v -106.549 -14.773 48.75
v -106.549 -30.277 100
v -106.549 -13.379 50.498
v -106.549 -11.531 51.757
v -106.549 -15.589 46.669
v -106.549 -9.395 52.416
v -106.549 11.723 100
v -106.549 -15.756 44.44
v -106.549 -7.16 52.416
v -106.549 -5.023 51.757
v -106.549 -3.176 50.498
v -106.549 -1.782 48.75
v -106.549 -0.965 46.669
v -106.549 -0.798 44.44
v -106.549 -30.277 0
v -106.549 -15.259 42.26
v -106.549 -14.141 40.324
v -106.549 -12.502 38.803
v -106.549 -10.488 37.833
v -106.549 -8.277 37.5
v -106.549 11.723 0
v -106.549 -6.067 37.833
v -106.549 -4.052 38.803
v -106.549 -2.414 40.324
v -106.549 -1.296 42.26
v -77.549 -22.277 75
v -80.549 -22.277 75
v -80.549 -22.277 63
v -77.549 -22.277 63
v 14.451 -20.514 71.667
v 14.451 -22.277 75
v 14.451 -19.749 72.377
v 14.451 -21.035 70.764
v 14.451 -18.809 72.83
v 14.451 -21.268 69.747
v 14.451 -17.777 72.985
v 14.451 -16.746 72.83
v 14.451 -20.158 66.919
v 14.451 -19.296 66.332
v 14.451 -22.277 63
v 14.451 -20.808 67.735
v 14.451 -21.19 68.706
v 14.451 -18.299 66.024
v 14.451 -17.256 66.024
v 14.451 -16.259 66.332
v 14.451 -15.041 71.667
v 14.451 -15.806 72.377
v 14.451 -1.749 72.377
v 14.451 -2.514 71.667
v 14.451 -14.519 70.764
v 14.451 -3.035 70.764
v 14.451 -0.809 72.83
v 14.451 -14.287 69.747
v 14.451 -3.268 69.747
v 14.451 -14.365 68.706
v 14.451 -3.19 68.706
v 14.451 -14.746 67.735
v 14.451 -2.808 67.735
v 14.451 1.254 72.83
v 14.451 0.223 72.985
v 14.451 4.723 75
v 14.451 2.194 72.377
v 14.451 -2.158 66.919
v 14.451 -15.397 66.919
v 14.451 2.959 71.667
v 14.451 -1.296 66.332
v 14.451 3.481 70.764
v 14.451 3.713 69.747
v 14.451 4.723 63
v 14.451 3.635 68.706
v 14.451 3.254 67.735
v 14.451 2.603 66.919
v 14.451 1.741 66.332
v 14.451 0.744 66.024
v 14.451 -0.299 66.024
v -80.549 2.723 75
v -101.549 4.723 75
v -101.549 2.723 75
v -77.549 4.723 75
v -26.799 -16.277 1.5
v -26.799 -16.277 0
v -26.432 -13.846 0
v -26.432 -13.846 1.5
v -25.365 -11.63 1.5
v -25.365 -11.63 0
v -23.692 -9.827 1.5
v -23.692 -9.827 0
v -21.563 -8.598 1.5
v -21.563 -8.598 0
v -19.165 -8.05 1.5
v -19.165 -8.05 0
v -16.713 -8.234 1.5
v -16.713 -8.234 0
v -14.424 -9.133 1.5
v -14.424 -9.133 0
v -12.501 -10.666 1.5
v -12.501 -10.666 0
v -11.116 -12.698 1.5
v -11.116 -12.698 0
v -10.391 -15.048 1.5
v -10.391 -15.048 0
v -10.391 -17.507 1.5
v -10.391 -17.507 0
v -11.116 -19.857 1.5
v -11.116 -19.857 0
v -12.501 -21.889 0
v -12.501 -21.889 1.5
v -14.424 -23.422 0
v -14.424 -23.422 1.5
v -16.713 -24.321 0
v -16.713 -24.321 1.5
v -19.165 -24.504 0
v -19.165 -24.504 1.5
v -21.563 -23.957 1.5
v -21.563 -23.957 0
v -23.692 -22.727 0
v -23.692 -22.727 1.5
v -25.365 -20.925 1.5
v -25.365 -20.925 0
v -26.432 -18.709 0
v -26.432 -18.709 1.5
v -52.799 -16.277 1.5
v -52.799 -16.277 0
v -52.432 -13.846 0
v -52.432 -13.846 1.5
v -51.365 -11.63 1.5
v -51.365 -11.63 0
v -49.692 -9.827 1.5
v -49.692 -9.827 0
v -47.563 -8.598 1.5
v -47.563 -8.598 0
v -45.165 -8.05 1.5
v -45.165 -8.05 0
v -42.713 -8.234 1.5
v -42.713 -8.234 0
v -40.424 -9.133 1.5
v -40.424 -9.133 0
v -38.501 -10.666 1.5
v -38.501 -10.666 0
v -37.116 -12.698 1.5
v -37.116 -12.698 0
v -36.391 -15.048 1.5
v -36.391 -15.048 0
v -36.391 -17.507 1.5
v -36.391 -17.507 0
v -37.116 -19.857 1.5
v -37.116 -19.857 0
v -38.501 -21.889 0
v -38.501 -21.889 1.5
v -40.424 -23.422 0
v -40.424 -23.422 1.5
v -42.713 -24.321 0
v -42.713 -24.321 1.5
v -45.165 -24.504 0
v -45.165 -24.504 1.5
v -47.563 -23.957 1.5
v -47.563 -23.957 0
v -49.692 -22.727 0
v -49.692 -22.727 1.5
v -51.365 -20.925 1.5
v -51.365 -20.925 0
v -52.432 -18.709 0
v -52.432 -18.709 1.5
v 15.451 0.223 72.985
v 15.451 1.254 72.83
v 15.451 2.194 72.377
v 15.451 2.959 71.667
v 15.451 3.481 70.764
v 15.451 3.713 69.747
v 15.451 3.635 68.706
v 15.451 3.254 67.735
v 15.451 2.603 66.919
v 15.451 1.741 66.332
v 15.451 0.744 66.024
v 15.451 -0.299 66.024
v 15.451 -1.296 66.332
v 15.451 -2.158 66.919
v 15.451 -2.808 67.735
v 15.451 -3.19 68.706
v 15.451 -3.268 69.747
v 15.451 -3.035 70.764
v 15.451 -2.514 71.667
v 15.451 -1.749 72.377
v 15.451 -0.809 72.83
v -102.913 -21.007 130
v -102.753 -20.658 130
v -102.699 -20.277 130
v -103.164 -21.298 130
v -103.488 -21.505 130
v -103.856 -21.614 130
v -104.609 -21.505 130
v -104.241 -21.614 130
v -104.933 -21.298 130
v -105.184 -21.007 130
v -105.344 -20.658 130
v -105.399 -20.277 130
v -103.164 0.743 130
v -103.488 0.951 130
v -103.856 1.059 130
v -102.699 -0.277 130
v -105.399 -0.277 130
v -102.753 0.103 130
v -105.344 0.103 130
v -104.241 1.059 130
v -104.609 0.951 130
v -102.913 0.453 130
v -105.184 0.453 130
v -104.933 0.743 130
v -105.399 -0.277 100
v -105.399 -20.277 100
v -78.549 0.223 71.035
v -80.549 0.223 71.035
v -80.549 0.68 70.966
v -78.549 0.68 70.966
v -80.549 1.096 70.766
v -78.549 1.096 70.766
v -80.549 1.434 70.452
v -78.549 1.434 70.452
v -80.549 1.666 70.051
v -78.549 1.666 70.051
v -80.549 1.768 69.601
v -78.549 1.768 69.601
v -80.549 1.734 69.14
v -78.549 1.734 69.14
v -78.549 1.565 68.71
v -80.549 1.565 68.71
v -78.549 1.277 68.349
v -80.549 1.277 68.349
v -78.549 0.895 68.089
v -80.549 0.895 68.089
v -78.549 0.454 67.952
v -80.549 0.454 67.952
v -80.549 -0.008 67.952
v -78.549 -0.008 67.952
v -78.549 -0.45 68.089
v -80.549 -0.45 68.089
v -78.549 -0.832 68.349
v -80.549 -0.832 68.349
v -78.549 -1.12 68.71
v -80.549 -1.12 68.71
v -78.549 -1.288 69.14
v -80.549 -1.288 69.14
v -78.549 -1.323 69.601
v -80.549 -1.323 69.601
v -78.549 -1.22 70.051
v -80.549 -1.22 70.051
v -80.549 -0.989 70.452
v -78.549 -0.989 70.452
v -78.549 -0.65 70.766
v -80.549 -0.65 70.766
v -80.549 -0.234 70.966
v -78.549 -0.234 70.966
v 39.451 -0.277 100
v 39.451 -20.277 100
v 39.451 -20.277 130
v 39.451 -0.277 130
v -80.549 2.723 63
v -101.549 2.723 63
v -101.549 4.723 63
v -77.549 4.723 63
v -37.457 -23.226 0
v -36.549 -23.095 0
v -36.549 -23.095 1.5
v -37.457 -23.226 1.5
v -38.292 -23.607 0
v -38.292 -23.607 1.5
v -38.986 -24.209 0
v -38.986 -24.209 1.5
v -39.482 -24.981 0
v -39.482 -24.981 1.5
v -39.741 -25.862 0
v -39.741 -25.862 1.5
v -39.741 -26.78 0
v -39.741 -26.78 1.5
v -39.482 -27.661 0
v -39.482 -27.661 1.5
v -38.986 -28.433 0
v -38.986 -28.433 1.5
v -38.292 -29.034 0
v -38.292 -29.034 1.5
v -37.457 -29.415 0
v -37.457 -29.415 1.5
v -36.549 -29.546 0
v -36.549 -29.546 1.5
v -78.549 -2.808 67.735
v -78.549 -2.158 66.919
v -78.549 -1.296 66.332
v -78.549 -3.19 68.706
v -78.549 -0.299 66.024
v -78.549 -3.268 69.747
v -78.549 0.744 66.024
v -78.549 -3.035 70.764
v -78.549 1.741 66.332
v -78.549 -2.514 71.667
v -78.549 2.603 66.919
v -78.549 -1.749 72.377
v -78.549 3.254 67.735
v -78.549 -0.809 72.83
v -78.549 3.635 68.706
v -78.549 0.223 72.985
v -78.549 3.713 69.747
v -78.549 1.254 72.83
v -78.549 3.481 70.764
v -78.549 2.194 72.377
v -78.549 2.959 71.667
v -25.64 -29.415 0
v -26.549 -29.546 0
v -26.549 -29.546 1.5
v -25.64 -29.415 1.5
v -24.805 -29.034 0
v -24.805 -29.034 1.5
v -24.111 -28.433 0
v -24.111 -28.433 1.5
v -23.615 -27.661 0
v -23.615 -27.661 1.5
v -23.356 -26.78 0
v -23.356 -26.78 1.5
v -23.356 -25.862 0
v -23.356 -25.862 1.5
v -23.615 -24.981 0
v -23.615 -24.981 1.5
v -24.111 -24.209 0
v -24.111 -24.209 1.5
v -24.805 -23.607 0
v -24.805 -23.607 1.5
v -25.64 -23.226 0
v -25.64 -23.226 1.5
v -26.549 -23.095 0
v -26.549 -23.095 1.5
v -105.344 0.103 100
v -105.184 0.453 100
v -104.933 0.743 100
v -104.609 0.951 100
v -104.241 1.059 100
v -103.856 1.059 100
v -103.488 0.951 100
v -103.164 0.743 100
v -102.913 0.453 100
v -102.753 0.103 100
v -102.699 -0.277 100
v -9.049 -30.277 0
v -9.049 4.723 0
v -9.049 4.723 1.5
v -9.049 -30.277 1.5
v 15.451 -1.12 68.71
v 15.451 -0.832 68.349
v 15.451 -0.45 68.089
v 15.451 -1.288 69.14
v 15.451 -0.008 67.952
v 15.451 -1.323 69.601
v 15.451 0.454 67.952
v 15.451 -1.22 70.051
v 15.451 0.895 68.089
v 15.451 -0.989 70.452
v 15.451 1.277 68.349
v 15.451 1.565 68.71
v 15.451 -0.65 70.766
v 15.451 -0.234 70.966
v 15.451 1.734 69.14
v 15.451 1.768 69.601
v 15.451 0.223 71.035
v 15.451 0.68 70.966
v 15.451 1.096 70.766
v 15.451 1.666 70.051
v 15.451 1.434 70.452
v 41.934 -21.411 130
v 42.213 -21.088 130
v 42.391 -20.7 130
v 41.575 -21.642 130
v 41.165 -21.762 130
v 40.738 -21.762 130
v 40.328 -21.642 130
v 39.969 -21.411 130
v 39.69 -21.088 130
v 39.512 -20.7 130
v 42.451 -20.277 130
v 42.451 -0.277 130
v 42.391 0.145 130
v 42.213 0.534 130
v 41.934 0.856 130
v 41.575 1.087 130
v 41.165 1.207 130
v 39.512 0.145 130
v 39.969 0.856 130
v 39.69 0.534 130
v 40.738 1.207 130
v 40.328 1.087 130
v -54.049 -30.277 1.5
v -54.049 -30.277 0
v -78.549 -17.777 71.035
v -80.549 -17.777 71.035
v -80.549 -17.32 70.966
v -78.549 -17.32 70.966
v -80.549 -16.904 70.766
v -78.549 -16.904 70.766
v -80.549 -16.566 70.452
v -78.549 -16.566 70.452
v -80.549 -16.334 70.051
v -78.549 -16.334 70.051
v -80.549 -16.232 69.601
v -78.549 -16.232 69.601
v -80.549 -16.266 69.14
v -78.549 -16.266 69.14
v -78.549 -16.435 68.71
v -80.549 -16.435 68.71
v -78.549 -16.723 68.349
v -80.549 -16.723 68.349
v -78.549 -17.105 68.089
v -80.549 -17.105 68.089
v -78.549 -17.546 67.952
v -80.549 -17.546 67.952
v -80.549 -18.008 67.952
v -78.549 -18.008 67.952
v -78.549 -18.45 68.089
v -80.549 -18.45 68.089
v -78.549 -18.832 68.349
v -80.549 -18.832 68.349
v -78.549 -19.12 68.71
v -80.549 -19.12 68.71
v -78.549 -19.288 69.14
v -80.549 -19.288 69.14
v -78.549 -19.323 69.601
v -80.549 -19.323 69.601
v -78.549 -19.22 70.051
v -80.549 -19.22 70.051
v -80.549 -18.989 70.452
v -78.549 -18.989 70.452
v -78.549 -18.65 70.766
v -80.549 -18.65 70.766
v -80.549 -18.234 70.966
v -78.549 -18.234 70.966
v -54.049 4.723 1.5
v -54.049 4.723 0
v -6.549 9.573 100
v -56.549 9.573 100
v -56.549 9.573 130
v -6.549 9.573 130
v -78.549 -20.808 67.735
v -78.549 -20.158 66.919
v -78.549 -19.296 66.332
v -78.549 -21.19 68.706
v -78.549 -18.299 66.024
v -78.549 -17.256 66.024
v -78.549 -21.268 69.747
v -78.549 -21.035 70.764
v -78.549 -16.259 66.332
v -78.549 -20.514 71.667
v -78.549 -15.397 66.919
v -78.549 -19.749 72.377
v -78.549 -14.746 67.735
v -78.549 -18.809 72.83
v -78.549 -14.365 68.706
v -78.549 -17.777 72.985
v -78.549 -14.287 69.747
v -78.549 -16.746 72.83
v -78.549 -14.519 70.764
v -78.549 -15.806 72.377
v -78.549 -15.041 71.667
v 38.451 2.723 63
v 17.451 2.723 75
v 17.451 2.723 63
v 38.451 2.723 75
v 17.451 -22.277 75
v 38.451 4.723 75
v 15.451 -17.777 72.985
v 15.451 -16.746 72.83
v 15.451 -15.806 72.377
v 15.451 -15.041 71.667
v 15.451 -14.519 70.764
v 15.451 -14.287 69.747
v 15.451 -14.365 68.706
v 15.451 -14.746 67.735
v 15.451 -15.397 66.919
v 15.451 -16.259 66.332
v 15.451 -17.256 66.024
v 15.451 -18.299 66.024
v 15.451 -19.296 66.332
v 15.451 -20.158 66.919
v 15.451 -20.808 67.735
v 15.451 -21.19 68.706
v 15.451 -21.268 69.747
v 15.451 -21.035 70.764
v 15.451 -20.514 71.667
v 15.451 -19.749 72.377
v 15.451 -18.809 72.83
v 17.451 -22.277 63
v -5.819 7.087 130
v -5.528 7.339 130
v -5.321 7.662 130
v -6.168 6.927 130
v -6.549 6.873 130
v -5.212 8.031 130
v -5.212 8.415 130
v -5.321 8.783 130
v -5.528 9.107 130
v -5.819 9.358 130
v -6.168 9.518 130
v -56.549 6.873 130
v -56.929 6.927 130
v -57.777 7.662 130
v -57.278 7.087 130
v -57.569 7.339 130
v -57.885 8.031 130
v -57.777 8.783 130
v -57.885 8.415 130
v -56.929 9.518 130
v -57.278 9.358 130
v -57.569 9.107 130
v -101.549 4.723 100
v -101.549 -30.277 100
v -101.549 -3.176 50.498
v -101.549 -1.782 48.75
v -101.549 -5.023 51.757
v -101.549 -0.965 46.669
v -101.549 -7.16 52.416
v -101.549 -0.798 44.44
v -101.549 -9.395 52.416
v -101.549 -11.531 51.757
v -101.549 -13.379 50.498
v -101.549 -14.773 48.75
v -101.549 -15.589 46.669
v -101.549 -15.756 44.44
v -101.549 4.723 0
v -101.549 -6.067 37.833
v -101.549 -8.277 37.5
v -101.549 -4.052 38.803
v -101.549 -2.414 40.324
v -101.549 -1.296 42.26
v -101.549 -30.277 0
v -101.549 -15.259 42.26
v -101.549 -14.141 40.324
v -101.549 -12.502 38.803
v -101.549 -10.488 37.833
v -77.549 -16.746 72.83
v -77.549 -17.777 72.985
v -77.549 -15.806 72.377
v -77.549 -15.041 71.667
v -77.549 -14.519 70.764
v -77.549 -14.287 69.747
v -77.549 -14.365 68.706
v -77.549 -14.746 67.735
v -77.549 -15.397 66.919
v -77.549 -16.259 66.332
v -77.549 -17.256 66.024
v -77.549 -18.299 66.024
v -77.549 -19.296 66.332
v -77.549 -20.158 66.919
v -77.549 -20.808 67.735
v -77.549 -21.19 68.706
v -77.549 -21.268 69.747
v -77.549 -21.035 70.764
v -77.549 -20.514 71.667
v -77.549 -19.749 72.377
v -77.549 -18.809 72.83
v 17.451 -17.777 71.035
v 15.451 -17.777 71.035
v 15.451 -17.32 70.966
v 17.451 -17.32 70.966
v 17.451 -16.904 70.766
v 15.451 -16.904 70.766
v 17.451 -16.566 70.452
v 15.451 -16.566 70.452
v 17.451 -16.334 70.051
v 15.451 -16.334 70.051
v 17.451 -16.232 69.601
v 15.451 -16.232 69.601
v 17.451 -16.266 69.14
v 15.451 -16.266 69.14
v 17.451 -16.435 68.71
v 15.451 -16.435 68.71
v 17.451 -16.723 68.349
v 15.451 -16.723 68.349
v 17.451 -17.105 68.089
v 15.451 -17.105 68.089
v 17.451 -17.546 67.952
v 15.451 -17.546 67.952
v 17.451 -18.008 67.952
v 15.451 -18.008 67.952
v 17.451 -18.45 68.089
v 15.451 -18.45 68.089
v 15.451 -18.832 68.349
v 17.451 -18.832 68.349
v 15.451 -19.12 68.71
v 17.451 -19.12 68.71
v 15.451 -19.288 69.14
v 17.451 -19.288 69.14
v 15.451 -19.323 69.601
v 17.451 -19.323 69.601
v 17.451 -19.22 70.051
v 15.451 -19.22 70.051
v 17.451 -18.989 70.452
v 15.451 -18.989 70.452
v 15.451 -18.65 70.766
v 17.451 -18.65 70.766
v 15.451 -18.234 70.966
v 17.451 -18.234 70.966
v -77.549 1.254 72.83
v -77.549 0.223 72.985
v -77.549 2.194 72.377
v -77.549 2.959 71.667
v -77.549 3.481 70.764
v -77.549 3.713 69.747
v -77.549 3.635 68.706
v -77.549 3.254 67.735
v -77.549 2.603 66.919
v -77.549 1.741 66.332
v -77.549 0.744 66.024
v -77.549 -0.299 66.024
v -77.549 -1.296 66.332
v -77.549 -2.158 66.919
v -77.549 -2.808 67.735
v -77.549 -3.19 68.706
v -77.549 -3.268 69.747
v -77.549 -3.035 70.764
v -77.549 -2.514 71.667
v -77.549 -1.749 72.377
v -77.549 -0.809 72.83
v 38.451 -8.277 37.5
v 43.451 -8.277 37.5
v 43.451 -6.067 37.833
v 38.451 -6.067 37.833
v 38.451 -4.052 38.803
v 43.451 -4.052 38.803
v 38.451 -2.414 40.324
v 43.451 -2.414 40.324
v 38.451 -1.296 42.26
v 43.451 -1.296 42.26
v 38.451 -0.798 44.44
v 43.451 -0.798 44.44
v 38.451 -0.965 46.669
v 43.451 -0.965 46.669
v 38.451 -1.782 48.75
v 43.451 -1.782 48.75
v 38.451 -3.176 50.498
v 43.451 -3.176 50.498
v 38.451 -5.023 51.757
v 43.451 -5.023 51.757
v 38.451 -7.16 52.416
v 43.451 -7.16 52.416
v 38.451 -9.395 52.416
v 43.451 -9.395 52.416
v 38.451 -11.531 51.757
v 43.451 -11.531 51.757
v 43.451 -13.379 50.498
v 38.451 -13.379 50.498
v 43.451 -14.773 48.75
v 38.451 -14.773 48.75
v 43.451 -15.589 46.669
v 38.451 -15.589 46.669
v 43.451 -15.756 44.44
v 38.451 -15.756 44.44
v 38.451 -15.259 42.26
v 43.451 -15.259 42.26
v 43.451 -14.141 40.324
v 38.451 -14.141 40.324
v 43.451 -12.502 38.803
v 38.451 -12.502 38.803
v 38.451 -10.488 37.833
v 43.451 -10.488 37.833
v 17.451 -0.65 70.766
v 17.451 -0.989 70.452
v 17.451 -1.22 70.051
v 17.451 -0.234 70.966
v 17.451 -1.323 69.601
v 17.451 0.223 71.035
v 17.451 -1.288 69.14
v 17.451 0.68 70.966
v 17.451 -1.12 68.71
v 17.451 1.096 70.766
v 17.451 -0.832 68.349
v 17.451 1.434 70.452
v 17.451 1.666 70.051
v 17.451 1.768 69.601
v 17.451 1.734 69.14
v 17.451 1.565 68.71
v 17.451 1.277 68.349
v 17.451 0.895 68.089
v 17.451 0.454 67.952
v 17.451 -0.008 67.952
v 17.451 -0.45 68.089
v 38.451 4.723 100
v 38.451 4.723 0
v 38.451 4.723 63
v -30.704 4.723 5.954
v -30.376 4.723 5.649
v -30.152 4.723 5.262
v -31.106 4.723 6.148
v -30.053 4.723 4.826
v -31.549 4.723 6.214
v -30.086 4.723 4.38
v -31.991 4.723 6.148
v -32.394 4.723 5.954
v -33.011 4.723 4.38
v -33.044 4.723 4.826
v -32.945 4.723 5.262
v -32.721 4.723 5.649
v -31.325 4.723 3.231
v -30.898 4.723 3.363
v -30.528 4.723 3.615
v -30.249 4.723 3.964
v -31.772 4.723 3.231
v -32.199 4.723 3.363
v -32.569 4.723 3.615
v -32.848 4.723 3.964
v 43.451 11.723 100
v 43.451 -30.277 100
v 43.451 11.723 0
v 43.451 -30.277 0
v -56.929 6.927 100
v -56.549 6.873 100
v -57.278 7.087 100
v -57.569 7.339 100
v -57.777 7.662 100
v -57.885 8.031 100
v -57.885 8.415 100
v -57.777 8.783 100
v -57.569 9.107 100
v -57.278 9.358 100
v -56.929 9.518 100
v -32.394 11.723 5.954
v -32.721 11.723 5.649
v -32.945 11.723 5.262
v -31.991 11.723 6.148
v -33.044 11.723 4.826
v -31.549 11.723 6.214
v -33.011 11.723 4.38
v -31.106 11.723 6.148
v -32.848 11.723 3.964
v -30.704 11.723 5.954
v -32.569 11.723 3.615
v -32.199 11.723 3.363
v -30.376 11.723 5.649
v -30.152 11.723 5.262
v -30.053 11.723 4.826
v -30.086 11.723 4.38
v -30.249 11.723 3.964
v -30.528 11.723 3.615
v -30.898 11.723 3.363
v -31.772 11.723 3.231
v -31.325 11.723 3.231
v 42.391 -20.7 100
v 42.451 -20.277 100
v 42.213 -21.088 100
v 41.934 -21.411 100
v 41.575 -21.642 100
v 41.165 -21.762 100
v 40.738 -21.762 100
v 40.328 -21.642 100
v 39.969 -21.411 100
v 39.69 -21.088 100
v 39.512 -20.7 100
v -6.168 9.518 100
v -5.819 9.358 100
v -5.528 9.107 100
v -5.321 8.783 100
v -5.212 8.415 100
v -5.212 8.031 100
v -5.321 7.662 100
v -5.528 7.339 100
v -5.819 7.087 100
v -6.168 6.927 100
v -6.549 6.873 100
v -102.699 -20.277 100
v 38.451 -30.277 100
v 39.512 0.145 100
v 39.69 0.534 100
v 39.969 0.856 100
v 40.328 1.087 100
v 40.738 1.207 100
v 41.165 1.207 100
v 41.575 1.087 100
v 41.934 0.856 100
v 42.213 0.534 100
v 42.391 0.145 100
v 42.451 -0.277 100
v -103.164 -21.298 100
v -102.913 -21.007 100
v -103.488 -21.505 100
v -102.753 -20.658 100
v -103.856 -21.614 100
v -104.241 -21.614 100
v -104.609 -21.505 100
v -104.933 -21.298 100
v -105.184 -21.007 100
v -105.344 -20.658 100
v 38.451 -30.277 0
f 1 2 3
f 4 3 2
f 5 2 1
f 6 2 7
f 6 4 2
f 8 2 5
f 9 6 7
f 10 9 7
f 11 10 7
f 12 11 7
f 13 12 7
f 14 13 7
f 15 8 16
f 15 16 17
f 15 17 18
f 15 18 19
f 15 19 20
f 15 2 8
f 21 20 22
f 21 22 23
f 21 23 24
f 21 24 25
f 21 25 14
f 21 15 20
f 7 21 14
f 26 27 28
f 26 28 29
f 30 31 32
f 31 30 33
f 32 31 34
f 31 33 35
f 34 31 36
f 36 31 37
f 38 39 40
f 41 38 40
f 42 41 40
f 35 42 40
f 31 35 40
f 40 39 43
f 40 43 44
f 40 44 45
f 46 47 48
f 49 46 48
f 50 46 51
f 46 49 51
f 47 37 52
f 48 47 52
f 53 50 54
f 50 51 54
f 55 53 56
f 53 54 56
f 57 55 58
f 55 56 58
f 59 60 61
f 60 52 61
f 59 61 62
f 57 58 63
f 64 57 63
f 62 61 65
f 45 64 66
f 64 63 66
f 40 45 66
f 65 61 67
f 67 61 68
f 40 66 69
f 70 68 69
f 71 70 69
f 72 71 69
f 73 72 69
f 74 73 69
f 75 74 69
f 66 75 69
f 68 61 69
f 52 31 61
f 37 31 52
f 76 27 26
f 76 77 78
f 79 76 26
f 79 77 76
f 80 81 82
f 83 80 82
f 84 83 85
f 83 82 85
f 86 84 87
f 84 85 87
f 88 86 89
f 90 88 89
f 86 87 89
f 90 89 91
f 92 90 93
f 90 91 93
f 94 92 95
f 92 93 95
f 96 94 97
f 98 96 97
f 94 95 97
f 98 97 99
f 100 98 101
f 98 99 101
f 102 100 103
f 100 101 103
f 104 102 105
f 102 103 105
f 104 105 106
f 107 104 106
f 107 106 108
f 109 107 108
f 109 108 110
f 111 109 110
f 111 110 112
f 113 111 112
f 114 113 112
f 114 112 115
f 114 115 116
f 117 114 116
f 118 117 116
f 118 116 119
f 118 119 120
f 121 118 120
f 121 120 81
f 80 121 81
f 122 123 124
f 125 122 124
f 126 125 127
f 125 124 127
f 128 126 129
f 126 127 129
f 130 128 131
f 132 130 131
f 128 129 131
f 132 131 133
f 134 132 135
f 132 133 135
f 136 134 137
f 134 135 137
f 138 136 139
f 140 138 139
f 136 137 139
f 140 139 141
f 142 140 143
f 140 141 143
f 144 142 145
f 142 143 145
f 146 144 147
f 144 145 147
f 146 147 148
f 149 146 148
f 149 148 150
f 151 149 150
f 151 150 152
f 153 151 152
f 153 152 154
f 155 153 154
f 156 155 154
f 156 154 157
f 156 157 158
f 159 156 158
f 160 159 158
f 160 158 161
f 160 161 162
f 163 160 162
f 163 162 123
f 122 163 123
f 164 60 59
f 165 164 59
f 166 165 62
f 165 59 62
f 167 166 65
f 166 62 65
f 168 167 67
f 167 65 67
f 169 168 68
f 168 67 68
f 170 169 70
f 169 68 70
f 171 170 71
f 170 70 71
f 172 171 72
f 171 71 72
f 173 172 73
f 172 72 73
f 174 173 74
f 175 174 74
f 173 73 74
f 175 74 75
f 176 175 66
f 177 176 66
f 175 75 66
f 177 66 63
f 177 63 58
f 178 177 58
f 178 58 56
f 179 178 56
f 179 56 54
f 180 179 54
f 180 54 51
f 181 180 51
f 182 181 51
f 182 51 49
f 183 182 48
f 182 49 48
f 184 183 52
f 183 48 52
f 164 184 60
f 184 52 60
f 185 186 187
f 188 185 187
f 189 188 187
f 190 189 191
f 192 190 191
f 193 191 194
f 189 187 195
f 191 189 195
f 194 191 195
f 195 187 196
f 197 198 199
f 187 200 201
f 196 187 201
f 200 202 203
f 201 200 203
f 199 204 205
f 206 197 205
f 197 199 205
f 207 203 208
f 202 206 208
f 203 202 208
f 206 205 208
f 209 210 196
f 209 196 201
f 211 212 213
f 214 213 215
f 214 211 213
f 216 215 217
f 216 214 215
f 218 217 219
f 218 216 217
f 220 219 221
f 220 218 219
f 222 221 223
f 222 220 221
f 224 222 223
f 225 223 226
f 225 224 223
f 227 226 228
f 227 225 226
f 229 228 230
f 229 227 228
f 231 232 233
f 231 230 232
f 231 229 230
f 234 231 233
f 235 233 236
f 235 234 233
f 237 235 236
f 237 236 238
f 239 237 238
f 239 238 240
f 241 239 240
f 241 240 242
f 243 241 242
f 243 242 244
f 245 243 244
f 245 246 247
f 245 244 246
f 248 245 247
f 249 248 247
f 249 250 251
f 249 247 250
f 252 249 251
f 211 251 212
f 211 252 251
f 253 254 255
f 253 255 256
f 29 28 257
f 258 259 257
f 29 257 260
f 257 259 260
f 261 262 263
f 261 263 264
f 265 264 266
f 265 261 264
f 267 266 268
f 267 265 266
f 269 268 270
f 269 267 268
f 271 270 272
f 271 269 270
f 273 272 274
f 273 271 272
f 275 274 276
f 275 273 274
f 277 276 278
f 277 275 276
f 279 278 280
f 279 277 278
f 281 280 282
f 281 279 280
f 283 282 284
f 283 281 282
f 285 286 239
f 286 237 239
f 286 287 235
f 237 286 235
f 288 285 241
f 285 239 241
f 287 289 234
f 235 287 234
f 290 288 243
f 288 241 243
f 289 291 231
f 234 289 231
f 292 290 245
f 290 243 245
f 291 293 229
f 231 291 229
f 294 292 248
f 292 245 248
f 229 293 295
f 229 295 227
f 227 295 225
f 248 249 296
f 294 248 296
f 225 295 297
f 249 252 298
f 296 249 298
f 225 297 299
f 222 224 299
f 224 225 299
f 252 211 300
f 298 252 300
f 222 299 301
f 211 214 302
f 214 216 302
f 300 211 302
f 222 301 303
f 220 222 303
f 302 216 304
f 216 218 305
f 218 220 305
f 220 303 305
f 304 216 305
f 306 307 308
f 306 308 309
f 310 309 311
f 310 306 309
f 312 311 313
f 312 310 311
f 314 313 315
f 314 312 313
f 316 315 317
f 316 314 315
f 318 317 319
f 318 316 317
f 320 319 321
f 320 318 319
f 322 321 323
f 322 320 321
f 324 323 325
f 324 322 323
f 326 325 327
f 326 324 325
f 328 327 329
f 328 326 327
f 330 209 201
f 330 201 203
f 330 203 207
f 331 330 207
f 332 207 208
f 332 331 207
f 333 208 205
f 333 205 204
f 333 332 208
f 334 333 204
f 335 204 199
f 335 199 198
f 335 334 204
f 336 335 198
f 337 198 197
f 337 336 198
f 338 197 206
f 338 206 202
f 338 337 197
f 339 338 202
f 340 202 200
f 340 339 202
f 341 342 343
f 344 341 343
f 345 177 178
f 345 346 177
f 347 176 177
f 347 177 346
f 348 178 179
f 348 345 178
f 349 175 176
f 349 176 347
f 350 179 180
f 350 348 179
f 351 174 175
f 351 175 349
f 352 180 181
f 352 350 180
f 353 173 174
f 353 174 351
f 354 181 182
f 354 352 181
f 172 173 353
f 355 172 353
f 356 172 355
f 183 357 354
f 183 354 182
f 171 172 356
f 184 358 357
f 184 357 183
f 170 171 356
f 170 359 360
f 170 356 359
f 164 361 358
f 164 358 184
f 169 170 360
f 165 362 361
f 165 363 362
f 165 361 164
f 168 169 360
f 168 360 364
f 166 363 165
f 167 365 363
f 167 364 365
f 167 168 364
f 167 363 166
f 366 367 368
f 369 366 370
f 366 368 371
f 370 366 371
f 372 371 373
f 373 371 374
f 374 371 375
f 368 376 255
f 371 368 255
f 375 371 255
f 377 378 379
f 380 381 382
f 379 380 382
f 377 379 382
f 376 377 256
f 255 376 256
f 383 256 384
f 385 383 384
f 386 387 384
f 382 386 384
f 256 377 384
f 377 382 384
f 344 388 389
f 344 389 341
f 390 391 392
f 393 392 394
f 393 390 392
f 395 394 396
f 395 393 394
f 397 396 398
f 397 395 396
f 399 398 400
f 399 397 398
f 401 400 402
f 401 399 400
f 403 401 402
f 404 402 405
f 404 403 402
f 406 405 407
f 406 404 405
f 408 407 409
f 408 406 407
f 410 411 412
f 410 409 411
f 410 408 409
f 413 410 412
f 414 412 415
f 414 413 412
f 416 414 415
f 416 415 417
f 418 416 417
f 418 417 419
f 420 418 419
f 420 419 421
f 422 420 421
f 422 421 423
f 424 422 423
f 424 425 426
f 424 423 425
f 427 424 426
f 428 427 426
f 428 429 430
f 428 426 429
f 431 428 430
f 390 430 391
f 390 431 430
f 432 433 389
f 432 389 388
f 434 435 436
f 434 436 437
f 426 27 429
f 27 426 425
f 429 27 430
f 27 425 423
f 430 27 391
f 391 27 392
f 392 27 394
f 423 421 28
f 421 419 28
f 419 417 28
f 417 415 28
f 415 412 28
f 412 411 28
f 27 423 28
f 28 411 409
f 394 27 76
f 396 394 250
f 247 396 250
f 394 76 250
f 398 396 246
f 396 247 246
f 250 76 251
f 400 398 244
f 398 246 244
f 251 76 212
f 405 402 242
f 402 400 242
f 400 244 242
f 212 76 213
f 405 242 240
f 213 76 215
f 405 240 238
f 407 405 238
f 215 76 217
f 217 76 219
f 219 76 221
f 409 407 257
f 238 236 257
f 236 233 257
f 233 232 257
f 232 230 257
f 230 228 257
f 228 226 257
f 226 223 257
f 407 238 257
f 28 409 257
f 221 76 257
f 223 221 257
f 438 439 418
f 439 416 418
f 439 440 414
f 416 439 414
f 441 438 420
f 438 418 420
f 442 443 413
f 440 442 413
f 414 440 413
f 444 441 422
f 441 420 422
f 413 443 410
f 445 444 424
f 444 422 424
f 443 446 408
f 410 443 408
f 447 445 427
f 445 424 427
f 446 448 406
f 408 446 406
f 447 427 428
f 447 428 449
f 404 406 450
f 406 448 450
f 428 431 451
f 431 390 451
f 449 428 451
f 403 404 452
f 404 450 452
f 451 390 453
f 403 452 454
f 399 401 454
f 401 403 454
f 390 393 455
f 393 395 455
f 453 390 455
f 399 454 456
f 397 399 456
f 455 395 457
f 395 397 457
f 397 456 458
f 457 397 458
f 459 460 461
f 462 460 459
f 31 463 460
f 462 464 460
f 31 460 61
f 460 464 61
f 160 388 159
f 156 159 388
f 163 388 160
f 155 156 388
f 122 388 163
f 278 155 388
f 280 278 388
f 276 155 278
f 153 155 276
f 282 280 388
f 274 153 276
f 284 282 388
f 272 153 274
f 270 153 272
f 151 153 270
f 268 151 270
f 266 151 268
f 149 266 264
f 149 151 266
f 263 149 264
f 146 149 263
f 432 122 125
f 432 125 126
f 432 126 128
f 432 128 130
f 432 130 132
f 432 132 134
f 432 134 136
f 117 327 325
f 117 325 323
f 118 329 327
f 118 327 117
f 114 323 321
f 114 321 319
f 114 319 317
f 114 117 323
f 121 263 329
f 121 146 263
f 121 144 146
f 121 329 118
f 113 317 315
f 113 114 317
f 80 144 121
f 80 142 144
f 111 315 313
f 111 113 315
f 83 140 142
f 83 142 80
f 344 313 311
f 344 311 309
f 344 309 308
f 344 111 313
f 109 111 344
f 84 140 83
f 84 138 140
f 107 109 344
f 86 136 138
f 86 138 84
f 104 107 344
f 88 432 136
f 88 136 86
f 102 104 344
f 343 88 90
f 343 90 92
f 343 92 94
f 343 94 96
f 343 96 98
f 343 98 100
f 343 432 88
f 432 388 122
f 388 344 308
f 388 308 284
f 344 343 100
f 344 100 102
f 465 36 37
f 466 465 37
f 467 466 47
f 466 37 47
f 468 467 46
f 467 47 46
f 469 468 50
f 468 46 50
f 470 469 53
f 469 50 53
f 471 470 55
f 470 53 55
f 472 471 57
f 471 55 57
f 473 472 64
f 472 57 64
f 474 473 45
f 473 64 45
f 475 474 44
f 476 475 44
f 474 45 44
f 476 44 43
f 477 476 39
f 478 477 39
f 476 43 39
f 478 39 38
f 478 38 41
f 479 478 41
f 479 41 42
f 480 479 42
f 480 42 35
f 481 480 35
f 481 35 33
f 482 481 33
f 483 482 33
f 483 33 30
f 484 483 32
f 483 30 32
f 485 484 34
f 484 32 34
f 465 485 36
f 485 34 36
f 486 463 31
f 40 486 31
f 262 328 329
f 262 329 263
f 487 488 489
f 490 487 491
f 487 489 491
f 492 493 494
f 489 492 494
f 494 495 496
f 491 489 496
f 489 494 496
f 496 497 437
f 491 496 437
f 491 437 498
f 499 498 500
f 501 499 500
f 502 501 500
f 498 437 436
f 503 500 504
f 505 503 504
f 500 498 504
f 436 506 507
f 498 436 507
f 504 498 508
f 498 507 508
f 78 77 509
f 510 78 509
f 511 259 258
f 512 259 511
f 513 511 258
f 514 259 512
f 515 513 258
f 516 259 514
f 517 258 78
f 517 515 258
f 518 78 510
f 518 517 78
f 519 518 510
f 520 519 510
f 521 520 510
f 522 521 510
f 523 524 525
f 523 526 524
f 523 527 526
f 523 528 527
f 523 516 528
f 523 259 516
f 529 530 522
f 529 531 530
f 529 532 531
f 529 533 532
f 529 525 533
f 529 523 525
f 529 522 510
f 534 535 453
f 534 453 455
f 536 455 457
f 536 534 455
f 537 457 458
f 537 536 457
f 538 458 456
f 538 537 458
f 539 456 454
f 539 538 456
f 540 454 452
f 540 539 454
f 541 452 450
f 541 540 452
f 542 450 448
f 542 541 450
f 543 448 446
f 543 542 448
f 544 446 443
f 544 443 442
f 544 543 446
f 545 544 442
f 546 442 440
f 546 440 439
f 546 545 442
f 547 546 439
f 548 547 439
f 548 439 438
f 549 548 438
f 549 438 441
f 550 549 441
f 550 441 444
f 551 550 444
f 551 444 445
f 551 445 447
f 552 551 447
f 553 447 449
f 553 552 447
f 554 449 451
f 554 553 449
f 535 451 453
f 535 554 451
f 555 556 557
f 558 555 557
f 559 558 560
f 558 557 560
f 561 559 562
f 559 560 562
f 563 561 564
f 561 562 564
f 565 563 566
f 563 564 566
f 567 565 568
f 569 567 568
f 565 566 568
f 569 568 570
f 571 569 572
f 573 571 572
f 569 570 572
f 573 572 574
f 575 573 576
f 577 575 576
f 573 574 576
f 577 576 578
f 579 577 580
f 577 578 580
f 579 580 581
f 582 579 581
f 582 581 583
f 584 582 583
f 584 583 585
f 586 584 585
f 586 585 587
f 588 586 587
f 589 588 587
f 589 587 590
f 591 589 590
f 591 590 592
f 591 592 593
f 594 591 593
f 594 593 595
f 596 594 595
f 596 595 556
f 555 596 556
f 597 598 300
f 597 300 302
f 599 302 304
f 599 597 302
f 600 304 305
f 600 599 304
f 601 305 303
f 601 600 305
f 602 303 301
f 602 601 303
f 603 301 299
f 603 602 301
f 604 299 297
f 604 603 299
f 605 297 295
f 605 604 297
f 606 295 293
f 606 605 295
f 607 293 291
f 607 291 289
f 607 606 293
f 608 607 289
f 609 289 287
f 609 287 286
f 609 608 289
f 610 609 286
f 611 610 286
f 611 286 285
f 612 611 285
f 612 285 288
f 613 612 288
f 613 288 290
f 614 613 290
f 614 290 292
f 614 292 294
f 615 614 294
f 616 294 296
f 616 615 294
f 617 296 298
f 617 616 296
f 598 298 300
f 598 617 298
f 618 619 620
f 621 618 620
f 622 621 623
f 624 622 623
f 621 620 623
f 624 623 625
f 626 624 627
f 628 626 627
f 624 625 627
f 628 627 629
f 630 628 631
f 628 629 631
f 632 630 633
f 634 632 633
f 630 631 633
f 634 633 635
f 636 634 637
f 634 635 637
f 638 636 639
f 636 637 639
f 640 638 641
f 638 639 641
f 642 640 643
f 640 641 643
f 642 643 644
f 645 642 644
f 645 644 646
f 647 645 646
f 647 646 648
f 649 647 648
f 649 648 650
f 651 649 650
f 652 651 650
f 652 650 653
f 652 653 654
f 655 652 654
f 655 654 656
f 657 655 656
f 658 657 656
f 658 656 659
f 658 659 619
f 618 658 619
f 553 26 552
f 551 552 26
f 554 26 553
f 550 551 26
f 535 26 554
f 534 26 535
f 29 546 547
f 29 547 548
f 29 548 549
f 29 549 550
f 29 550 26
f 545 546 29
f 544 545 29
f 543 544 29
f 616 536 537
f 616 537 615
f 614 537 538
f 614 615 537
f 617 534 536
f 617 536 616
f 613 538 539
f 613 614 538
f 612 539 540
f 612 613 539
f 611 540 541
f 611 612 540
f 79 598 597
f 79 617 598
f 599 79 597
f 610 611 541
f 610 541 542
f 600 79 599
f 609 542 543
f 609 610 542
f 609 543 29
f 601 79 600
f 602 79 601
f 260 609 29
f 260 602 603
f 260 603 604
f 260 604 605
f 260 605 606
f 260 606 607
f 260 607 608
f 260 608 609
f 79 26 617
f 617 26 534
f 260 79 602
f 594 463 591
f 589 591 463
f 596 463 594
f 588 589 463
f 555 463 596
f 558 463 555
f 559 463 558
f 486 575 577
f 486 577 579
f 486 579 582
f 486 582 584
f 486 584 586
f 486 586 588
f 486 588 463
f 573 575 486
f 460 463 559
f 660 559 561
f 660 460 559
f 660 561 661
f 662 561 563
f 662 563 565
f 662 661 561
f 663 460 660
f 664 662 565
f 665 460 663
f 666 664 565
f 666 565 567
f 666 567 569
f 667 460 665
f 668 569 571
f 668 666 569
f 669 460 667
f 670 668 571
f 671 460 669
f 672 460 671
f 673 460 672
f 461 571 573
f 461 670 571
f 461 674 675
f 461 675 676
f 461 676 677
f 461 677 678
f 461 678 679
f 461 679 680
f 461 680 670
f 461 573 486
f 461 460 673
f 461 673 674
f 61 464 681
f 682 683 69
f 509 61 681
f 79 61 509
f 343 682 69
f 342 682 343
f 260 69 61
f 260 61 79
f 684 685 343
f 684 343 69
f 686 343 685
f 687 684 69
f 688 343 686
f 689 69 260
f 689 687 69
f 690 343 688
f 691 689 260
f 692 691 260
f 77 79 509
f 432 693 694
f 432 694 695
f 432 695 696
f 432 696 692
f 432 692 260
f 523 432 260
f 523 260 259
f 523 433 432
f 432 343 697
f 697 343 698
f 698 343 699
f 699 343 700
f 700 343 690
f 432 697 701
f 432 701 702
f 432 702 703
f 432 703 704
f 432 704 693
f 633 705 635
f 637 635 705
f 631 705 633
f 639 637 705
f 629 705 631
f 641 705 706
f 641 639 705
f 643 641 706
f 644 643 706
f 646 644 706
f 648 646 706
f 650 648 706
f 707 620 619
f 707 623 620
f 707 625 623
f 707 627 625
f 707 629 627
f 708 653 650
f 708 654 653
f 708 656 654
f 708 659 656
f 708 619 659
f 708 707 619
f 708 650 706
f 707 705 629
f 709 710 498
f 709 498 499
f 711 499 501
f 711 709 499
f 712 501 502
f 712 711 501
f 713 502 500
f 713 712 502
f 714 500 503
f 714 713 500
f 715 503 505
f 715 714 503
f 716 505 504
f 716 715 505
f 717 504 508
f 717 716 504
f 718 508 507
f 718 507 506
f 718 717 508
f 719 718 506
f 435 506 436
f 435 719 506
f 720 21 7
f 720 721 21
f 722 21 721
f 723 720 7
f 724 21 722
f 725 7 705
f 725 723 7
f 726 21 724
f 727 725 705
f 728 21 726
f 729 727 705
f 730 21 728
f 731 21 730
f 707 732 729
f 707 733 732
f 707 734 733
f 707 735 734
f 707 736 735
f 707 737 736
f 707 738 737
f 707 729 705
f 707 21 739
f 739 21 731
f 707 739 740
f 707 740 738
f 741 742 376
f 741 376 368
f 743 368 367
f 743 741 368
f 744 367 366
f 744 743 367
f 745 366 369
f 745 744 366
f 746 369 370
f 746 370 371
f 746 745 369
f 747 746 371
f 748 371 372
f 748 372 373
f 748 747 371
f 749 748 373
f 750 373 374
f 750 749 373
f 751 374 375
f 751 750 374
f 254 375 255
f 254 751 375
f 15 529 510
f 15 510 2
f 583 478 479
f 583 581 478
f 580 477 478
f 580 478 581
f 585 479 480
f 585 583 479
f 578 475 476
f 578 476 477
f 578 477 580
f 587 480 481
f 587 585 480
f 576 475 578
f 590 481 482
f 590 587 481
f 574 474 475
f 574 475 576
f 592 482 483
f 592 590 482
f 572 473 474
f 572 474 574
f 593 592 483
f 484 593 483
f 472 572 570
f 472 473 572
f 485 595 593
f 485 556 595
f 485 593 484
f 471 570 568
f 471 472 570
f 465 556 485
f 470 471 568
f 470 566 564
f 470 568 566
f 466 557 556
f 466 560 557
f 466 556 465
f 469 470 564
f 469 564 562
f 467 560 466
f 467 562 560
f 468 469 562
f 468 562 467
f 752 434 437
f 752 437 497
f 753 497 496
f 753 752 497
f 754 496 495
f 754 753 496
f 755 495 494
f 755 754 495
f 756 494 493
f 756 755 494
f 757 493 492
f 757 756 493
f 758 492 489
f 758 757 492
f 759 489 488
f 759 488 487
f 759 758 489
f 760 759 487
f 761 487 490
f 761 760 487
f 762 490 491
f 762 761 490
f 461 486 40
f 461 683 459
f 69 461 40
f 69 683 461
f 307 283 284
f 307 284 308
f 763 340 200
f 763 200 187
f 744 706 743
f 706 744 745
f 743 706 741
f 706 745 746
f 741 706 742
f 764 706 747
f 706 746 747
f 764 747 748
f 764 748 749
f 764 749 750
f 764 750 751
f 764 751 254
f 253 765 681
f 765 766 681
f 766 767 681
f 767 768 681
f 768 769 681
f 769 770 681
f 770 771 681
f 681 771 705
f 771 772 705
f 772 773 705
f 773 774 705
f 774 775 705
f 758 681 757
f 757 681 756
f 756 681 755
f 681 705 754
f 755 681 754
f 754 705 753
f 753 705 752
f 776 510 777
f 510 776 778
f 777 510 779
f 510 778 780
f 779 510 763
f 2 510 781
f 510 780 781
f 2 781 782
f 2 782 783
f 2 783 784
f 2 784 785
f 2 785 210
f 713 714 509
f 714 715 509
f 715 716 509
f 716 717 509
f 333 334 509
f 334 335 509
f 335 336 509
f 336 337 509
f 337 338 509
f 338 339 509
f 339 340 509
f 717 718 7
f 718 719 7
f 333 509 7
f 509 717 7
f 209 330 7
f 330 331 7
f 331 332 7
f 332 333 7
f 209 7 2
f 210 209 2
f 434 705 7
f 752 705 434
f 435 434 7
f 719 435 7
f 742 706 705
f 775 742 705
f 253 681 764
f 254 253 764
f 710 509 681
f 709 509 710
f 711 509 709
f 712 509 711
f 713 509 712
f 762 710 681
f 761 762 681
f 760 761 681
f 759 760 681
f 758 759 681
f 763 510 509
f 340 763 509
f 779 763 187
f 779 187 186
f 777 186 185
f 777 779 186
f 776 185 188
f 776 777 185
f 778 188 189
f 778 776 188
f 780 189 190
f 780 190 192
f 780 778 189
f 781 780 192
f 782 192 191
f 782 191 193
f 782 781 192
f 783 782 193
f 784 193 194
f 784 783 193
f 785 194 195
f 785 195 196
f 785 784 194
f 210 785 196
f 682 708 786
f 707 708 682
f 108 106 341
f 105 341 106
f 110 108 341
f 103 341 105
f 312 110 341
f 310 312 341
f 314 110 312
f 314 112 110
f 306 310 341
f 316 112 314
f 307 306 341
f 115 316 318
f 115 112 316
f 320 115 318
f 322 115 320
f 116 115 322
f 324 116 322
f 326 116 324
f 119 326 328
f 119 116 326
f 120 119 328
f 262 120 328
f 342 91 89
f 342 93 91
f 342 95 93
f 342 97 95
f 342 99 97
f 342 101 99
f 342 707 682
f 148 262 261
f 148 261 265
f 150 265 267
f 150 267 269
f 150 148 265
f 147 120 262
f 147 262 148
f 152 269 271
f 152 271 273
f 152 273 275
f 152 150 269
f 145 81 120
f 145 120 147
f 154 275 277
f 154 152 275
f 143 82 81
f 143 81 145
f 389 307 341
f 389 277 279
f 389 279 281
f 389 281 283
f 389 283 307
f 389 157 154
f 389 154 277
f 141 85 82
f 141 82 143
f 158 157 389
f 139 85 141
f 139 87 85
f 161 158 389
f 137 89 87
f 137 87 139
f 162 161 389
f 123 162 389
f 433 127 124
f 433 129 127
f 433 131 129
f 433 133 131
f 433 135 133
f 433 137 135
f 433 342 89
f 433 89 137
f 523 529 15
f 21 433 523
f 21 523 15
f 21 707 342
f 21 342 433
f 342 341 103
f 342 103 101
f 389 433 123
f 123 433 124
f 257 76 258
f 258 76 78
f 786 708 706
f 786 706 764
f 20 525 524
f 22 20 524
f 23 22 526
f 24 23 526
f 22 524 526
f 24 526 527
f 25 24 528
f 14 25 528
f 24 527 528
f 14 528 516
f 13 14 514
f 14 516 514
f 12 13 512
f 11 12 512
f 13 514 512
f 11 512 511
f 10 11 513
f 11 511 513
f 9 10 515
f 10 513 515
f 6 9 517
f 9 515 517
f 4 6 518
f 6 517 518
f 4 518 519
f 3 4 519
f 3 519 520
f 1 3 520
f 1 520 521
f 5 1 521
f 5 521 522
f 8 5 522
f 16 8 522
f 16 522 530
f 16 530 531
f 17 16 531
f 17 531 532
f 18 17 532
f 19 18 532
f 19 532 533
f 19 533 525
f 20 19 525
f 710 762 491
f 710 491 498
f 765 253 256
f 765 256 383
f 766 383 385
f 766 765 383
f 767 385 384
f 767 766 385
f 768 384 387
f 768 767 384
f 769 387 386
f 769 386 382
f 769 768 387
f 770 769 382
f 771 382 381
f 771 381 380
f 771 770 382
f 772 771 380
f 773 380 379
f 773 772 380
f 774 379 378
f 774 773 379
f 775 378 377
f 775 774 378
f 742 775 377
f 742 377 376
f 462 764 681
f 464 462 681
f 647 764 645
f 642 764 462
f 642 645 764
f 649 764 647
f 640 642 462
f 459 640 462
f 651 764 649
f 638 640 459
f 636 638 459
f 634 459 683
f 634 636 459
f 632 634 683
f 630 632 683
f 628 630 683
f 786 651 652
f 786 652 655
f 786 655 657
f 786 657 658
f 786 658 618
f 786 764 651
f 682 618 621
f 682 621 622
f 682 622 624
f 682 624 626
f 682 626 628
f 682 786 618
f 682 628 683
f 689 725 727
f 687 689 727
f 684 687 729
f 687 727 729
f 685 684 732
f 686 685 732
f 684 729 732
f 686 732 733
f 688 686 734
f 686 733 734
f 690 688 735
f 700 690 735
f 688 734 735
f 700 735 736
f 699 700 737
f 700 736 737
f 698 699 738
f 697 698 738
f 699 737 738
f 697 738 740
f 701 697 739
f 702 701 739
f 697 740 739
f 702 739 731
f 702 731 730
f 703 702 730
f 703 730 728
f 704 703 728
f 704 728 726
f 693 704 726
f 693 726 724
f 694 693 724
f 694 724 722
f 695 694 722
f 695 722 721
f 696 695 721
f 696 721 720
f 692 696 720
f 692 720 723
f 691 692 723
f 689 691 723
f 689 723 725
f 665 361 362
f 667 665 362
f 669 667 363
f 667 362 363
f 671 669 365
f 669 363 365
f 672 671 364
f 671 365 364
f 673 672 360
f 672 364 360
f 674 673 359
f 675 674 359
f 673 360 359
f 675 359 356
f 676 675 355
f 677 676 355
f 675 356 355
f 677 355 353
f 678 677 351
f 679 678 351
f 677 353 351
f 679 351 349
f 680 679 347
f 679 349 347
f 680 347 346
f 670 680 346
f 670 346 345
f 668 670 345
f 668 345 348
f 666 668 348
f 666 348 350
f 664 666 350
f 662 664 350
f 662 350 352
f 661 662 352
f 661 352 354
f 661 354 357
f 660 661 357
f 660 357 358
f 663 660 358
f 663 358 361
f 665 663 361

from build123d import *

# Parameters (mm, degrees)
BOSS_EXTRUDE2_DEPTH = 100
BOSS_EXTRUDE3_DEPTH = 30
SKETCH10_R          = 7.5
CUT_EXTRUDE2_DEPTH  = 210
SKETCH15_R          = 1.5
CUT_EXTRUDE3_DEPTH  = 10
SKETCH16_W          = 24
SKETCH16_H          = 12
BOSS_EXTRUDE5_DEPTH = 2
SKETCH17_W          = 3
SKETCH17_H          = 12
BOSS_EXTRUDE6_DEPTH = 25
SKETCH19_R          = 3.5
CUT_EXTRUDE4_DEPTH  = 1
SKETCH20_R          = 1.55
CUT_EXTRUDE5_DEPTH  = 3
SKETCH21_W          = 45
SKETCH21_H          = 1.5
BOSS_EXTRUDE7_DEPTH = 35
SKETCH23_R          = 8.25
CUT_EXTRUDE6_DEPTH  = 40
CUT_EXTRUDE7_DEPTH  = 40


with BuildPart() as part:
    # Sketch3 → Boss-Extrude2 (new body)
    with BuildSketch(Plane.XY):
        Polygon((-106.54853621, -30.277349769), (-106.54853621, 11.722650231), (43.45146379, 11.722650231), (43.45146379, -30.277349769), (38.45146379, -30.277349769), (38.45146379, 4.722650231), (-101.54853621, 4.722650231), (-101.54853621, -30.277349769), align=None)
    extrude(amount=BOSS_EXTRUDE2_DEPTH)

    # Sketch4 → Boss-Extrude3 (add)
    with BuildSketch(Plane.XY.offset(100)):
        with BuildLine():
            Line((-102.69853621, -0.277349769), (-102.69853621, -20.277349769))
            ThreePointArc((-102.69853621, -20.277349769), (-104.04853621, -21.627349769), (-105.39853621, -20.277349769))
            Line((-105.39853621, -20.277349769), (-105.39853621, -0.277349769))
            ThreePointArc((-105.39853621, -0.277349769), (-104.04853621, 1.072650231), (-102.69853621, -0.277349769))
        make_face()
        with BuildLine():
            Line((-56.54853621, 9.572650231), (-6.54853621, 9.572650231))
            ThreePointArc((-6.54853621, 9.572650231), (-5.19853621, 8.222650231), (-6.54853621, 6.872650231))
            Line((-6.54853621, 6.872650231), (-56.54853621, 6.872650231))
            ThreePointArc((-56.54853621, 6.872650231), (-57.89853621, 8.222650231), (-56.54853621, 9.572650231))
        make_face()
        with BuildLine():
            Line((42.45146379, -0.277349769), (42.45146379, -20.277349769))
            ThreePointArc((42.45146379, -20.277349769), (40.95146379, -21.777349769), (39.45146379, -20.277349769))
            Line((39.45146379, -20.277349769), (39.45146379, -0.277349769))
            ThreePointArc((39.45146379, -0.277349769), (40.95146379, 1.222650231), (42.45146379, -0.277349769))
        make_face()
    extrude(amount=BOSS_EXTRUDE3_DEPTH)

    # Sketch10 → Cut-Extrude2 (cut)
    with BuildSketch(Plane(origin=(43.45146379, 0, 0), x_dir=(0, 0, -1), z_dir=(1, 0, 0))):
        with Locations((-45, -8.277349769)):
            Circle(SKETCH10_R)
    extrude(amount=-CUT_EXTRUDE2_DEPTH, mode=Mode.SUBTRACT)

    # Sketch15 → Cut-Extrude3 (cut)
    with BuildSketch(Plane(origin=(0, 11.722650231, 0), x_dir=(1, 0, 0), z_dir=(0, 1, 0))):
        with Locations(Location((-31.54853621, -4.714245873, 0), (0, 0, 270))):
            Circle(SKETCH15_R)
    extrude(amount=-CUT_EXTRUDE3_DEPTH, mode=Mode.SUBTRACT)

    # Sketch16 → Boss-Extrude5 (add)
    with BuildSketch(Plane.XZ.offset(-4.722650231)):
        with Locations((26.45146379, 69)):
            Rectangle(SKETCH16_W, SKETCH16_H)
    boss_extrude5 = extrude(amount=BOSS_EXTRUDE5_DEPTH)

    # Sketch17 → Boss-Extrude6 (add)
    with BuildSketch(Plane(origin=(0, 2.722650231, 0), x_dir=(-1, 0, 0), z_dir=(0, -1, 0))):
        with Locations((-15.95146379, -69)):
            Rectangle(SKETCH17_W, SKETCH17_H)
    boss_extrude6 = extrude(amount=BOSS_EXTRUDE6_DEPTH)

    # Sketch19 → Cut-Extrude4 (cut)
    with BuildSketch(Plane.ZY.offset(-14.45146379)):
        with Locations((69.485133357, 0.222650231)):
            Circle(SKETCH19_R)
        with Locations((69.485133357, -17.777349769)):
            Circle(SKETCH19_R)
    cut_extrude4 = extrude(amount=-CUT_EXTRUDE4_DEPTH, mode=Mode.SUBTRACT)

    # Sketch20 → Cut-Extrude5 (cut)
    with BuildSketch(Plane.ZY.offset(-15.45146379)):
        with Locations((69.485133357, 0.222650231)):
            Circle(SKETCH20_R)
        with Locations((69.485133357, -17.777349769)):
            Circle(SKETCH20_R)
    cut_extrude5 = extrude(amount=-CUT_EXTRUDE5_DEPTH, mode=Mode.SUBTRACT)

    # Mirror6: Boss-Extrude5, Boss-Extrude6, Cut-Extrude4, Cut-Extrude5 across plane
    add(boss_extrude5.mirror(Plane.ZY.offset(31.54853621)))
    add(boss_extrude6.mirror(Plane.ZY.offset(31.54853621)))
    add(cut_extrude4.mirror(Plane.ZY.offset(31.54853621)), mode=Mode.SUBTRACT)
    add(cut_extrude5.mirror(Plane.ZY.offset(31.54853621)), mode=Mode.SUBTRACT)

    # Sketch21 → Boss-Extrude7 (add)
    with BuildSketch(Plane.XZ.offset(-4.722650231)):
        with Locations((-31.54853621, 0.75)):
            Rectangle(SKETCH21_W, SKETCH21_H)
    extrude(amount=BOSS_EXTRUDE7_DEPTH)

    # Sketch23 → Cut-Extrude6 (cut)
    with BuildSketch(Plane(origin=(0, 0, 0), x_dir=(-1, 0, 0), z_dir=(0, 0, -1))):
        with Locations((44.54853621, -16.277349769)):
            Circle(SKETCH23_R)
        with Locations((18.54853621, -16.277349769)):
            Circle(SKETCH23_R)
    extrude(amount=-CUT_EXTRUDE6_DEPTH, mode=Mode.SUBTRACT)

    # Sketch24 → Cut-Extrude7 (cut)
    with BuildSketch(Plane(origin=(0, 0, 0), x_dir=(-1, 0, 0), z_dir=(0, 0, -1))):
        with BuildLine():
            Line((26.54853621, -23.095326639), (36.54853621, -23.095326639))
            ThreePointArc((36.54853621, -23.095326639), (39.773941895, -26.320732325), (36.54853621, -29.54613801))
            Line((36.54853621, -29.54613801), (26.54853621, -29.54613801))
            ThreePointArc((26.54853621, -29.54613801), (23.323130524, -26.320732325), (26.54853621, -23.095326639))
        make_face()
    extrude(amount=-CUT_EXTRUDE7_DEPTH, mode=Mode.SUBTRACT)


solid = part.part
